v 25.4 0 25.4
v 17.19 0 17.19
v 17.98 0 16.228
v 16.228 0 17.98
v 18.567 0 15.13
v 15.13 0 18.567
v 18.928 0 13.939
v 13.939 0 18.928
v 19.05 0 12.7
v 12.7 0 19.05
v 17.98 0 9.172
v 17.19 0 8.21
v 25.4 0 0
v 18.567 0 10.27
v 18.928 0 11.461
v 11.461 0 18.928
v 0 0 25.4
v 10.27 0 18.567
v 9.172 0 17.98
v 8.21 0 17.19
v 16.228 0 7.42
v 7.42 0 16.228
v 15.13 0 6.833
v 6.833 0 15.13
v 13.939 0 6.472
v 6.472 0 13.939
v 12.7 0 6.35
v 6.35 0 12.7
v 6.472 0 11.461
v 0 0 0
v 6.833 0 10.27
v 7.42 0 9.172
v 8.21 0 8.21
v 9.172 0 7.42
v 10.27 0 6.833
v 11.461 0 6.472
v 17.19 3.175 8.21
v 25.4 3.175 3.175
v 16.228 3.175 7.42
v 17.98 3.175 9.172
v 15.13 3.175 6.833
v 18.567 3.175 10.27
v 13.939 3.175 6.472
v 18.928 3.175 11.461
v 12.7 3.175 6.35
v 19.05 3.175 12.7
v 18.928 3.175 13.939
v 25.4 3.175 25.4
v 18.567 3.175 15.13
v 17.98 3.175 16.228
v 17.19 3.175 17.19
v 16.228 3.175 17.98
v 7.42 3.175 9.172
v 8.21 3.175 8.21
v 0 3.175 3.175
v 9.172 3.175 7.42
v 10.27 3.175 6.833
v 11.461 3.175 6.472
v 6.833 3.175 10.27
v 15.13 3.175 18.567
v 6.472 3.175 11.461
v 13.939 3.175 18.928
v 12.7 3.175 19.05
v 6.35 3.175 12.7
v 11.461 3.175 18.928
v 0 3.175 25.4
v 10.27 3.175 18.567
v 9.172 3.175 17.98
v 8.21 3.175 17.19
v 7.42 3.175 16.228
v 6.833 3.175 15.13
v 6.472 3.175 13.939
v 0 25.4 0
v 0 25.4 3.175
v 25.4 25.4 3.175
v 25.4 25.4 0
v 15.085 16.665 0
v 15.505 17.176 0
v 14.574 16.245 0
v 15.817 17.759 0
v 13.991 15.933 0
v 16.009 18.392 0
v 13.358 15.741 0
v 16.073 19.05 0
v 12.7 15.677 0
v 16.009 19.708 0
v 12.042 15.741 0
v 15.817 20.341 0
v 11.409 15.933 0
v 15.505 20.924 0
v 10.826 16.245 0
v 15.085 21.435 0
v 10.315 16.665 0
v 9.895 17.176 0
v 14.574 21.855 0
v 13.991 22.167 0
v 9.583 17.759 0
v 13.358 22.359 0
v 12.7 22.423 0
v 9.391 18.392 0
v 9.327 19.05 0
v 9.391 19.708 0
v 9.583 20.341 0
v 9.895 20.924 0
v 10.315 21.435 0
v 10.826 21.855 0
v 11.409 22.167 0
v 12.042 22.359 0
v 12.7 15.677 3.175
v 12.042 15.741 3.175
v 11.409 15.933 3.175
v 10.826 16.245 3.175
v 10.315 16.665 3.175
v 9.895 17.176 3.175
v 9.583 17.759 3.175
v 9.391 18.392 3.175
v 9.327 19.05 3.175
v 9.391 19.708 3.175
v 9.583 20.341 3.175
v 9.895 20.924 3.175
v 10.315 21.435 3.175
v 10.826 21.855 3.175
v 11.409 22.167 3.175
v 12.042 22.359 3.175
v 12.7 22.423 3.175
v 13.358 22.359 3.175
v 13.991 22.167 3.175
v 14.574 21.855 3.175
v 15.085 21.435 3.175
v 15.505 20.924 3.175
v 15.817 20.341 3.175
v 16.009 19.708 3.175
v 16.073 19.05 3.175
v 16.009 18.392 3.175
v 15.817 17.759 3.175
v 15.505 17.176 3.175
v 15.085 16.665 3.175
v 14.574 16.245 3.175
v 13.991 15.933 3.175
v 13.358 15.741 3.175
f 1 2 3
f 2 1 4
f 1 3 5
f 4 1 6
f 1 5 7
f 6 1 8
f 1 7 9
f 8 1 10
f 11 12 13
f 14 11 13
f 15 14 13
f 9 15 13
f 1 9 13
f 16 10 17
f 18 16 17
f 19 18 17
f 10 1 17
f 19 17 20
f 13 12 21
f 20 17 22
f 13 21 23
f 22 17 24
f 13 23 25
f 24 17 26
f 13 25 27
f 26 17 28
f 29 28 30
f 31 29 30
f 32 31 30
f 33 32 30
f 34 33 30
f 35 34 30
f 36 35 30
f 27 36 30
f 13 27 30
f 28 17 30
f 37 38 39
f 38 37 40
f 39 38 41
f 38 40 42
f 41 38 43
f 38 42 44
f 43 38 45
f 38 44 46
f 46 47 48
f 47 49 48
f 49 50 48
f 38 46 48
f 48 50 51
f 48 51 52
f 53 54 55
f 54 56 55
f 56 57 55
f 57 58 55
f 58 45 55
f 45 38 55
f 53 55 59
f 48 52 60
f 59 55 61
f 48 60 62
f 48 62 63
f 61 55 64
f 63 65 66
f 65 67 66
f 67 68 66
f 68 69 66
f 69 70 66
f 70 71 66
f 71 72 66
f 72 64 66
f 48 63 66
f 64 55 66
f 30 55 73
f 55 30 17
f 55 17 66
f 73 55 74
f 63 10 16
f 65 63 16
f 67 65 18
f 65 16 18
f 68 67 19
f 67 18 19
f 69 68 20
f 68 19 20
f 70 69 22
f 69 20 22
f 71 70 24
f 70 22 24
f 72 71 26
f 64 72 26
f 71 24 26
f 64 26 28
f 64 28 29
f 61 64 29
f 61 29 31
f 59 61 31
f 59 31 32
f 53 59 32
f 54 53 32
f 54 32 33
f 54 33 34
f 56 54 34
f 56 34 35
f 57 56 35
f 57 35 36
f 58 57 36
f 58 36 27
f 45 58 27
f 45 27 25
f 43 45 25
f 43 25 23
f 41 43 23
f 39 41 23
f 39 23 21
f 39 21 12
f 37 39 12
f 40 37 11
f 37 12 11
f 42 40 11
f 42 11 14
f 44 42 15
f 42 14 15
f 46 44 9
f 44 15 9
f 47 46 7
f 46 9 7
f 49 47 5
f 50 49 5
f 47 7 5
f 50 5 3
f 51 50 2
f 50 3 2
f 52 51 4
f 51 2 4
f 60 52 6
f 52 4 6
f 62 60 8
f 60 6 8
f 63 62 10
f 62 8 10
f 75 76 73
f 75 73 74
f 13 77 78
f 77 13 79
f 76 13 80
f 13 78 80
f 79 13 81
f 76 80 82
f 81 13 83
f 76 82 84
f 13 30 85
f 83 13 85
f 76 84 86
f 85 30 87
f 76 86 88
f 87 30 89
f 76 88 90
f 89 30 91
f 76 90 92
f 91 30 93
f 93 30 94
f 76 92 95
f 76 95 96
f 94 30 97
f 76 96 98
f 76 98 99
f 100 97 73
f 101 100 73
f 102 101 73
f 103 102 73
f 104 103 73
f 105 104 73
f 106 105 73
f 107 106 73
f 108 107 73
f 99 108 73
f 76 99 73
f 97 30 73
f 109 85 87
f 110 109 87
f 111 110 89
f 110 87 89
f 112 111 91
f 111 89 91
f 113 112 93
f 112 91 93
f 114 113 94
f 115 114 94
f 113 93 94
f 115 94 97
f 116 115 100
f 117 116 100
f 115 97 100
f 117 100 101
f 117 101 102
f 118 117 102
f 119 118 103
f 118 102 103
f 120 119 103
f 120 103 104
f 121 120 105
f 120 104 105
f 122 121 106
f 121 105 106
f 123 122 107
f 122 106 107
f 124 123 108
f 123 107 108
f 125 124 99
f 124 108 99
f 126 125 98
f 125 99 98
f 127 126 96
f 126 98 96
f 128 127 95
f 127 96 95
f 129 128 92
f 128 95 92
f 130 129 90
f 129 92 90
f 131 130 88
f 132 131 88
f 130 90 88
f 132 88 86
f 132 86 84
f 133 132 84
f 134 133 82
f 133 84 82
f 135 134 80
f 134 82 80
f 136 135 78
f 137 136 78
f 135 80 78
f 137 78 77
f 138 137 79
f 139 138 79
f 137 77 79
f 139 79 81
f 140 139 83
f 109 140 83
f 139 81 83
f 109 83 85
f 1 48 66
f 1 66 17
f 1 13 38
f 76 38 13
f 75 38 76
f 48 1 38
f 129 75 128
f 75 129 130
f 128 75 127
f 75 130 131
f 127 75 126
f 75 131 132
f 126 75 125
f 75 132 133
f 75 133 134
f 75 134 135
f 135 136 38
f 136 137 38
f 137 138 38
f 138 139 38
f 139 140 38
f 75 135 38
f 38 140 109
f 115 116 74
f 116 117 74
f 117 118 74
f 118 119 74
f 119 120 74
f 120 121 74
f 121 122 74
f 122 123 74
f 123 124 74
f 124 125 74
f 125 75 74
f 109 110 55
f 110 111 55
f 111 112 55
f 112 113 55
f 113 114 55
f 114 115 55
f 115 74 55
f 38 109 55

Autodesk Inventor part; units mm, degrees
ref_plane "YZ Plane" through (0, 0, 0) normal (1, 0, 0) x (0, 1, 0)
ref_plane "XZ Plane" through (0, 0, 0) normal (0, 1, 0) x (-1, 0, 0)
ref_plane "XY Plane" through (0, 0, 0) normal (0, 0, 1) x (1, 0, 0)
sketch "Sketch1" plane through (0, 0, 0) normal (1, 0, 0) x (0, 1, 0)
  line L0 (0, 0) -> (25.4, 0)
  line L1 (25.4, 0) -> (25.4, 3.175)
  line L2 (25.4, 3.175) -> (3.175, 3.175)
  line L3 (3.175, 3.175) -> (3.175, 25.4)
  line L4 (3.175, 25.4) -> (0, 25.4)
  line L5 (0, 25.4) -> (0, 0)
  dimension "d0" = 25.4
  dimension "d1" = 25.4
  dimension "d2" = 3.175
  dimension "d3" = 3.175
extrude "Extrusion1" add sketch "Sketch1" along normal blind 25.4
sketch "Sketch2" plane through (0, 3.175, 3.175) normal (0, 0, 1) x (1, 0, 0)
  line L0 (25.4, -3.175) -> (25.4, 22.225) projected
  line L1 (0, 22.225) -> (25.4, 22.225) projected
  point P0 (0, -3.175)
  point P1 (12.7, 15.875)
  dimension "d6" = 12.7
  dimension "d7" = 6.35
hole "Hole1" at (12.7, 19.05, 3.175) direction (0, 0, -1) diameter 6.7469 end through all
sketch "Sketch3" plane through (0, 3.175, 25.4) normal (0, 1, 0) x (1, 0, 0)
  line L0 (0, 25.4) -> (25.4, 25.4) projected
  line L1 (25.4, 22.225) -> (25.4, 0) projected
  point P0 (12.7, 12.7)
  dimension "d15" = 12.7
  dimension "d16" = 12.7
hole "Hole2" at (12.7, 3.175, 12.7) direction (0, -1, 0) diameter 12.7 end through all
properties part number "15102898-16-P-0313"
